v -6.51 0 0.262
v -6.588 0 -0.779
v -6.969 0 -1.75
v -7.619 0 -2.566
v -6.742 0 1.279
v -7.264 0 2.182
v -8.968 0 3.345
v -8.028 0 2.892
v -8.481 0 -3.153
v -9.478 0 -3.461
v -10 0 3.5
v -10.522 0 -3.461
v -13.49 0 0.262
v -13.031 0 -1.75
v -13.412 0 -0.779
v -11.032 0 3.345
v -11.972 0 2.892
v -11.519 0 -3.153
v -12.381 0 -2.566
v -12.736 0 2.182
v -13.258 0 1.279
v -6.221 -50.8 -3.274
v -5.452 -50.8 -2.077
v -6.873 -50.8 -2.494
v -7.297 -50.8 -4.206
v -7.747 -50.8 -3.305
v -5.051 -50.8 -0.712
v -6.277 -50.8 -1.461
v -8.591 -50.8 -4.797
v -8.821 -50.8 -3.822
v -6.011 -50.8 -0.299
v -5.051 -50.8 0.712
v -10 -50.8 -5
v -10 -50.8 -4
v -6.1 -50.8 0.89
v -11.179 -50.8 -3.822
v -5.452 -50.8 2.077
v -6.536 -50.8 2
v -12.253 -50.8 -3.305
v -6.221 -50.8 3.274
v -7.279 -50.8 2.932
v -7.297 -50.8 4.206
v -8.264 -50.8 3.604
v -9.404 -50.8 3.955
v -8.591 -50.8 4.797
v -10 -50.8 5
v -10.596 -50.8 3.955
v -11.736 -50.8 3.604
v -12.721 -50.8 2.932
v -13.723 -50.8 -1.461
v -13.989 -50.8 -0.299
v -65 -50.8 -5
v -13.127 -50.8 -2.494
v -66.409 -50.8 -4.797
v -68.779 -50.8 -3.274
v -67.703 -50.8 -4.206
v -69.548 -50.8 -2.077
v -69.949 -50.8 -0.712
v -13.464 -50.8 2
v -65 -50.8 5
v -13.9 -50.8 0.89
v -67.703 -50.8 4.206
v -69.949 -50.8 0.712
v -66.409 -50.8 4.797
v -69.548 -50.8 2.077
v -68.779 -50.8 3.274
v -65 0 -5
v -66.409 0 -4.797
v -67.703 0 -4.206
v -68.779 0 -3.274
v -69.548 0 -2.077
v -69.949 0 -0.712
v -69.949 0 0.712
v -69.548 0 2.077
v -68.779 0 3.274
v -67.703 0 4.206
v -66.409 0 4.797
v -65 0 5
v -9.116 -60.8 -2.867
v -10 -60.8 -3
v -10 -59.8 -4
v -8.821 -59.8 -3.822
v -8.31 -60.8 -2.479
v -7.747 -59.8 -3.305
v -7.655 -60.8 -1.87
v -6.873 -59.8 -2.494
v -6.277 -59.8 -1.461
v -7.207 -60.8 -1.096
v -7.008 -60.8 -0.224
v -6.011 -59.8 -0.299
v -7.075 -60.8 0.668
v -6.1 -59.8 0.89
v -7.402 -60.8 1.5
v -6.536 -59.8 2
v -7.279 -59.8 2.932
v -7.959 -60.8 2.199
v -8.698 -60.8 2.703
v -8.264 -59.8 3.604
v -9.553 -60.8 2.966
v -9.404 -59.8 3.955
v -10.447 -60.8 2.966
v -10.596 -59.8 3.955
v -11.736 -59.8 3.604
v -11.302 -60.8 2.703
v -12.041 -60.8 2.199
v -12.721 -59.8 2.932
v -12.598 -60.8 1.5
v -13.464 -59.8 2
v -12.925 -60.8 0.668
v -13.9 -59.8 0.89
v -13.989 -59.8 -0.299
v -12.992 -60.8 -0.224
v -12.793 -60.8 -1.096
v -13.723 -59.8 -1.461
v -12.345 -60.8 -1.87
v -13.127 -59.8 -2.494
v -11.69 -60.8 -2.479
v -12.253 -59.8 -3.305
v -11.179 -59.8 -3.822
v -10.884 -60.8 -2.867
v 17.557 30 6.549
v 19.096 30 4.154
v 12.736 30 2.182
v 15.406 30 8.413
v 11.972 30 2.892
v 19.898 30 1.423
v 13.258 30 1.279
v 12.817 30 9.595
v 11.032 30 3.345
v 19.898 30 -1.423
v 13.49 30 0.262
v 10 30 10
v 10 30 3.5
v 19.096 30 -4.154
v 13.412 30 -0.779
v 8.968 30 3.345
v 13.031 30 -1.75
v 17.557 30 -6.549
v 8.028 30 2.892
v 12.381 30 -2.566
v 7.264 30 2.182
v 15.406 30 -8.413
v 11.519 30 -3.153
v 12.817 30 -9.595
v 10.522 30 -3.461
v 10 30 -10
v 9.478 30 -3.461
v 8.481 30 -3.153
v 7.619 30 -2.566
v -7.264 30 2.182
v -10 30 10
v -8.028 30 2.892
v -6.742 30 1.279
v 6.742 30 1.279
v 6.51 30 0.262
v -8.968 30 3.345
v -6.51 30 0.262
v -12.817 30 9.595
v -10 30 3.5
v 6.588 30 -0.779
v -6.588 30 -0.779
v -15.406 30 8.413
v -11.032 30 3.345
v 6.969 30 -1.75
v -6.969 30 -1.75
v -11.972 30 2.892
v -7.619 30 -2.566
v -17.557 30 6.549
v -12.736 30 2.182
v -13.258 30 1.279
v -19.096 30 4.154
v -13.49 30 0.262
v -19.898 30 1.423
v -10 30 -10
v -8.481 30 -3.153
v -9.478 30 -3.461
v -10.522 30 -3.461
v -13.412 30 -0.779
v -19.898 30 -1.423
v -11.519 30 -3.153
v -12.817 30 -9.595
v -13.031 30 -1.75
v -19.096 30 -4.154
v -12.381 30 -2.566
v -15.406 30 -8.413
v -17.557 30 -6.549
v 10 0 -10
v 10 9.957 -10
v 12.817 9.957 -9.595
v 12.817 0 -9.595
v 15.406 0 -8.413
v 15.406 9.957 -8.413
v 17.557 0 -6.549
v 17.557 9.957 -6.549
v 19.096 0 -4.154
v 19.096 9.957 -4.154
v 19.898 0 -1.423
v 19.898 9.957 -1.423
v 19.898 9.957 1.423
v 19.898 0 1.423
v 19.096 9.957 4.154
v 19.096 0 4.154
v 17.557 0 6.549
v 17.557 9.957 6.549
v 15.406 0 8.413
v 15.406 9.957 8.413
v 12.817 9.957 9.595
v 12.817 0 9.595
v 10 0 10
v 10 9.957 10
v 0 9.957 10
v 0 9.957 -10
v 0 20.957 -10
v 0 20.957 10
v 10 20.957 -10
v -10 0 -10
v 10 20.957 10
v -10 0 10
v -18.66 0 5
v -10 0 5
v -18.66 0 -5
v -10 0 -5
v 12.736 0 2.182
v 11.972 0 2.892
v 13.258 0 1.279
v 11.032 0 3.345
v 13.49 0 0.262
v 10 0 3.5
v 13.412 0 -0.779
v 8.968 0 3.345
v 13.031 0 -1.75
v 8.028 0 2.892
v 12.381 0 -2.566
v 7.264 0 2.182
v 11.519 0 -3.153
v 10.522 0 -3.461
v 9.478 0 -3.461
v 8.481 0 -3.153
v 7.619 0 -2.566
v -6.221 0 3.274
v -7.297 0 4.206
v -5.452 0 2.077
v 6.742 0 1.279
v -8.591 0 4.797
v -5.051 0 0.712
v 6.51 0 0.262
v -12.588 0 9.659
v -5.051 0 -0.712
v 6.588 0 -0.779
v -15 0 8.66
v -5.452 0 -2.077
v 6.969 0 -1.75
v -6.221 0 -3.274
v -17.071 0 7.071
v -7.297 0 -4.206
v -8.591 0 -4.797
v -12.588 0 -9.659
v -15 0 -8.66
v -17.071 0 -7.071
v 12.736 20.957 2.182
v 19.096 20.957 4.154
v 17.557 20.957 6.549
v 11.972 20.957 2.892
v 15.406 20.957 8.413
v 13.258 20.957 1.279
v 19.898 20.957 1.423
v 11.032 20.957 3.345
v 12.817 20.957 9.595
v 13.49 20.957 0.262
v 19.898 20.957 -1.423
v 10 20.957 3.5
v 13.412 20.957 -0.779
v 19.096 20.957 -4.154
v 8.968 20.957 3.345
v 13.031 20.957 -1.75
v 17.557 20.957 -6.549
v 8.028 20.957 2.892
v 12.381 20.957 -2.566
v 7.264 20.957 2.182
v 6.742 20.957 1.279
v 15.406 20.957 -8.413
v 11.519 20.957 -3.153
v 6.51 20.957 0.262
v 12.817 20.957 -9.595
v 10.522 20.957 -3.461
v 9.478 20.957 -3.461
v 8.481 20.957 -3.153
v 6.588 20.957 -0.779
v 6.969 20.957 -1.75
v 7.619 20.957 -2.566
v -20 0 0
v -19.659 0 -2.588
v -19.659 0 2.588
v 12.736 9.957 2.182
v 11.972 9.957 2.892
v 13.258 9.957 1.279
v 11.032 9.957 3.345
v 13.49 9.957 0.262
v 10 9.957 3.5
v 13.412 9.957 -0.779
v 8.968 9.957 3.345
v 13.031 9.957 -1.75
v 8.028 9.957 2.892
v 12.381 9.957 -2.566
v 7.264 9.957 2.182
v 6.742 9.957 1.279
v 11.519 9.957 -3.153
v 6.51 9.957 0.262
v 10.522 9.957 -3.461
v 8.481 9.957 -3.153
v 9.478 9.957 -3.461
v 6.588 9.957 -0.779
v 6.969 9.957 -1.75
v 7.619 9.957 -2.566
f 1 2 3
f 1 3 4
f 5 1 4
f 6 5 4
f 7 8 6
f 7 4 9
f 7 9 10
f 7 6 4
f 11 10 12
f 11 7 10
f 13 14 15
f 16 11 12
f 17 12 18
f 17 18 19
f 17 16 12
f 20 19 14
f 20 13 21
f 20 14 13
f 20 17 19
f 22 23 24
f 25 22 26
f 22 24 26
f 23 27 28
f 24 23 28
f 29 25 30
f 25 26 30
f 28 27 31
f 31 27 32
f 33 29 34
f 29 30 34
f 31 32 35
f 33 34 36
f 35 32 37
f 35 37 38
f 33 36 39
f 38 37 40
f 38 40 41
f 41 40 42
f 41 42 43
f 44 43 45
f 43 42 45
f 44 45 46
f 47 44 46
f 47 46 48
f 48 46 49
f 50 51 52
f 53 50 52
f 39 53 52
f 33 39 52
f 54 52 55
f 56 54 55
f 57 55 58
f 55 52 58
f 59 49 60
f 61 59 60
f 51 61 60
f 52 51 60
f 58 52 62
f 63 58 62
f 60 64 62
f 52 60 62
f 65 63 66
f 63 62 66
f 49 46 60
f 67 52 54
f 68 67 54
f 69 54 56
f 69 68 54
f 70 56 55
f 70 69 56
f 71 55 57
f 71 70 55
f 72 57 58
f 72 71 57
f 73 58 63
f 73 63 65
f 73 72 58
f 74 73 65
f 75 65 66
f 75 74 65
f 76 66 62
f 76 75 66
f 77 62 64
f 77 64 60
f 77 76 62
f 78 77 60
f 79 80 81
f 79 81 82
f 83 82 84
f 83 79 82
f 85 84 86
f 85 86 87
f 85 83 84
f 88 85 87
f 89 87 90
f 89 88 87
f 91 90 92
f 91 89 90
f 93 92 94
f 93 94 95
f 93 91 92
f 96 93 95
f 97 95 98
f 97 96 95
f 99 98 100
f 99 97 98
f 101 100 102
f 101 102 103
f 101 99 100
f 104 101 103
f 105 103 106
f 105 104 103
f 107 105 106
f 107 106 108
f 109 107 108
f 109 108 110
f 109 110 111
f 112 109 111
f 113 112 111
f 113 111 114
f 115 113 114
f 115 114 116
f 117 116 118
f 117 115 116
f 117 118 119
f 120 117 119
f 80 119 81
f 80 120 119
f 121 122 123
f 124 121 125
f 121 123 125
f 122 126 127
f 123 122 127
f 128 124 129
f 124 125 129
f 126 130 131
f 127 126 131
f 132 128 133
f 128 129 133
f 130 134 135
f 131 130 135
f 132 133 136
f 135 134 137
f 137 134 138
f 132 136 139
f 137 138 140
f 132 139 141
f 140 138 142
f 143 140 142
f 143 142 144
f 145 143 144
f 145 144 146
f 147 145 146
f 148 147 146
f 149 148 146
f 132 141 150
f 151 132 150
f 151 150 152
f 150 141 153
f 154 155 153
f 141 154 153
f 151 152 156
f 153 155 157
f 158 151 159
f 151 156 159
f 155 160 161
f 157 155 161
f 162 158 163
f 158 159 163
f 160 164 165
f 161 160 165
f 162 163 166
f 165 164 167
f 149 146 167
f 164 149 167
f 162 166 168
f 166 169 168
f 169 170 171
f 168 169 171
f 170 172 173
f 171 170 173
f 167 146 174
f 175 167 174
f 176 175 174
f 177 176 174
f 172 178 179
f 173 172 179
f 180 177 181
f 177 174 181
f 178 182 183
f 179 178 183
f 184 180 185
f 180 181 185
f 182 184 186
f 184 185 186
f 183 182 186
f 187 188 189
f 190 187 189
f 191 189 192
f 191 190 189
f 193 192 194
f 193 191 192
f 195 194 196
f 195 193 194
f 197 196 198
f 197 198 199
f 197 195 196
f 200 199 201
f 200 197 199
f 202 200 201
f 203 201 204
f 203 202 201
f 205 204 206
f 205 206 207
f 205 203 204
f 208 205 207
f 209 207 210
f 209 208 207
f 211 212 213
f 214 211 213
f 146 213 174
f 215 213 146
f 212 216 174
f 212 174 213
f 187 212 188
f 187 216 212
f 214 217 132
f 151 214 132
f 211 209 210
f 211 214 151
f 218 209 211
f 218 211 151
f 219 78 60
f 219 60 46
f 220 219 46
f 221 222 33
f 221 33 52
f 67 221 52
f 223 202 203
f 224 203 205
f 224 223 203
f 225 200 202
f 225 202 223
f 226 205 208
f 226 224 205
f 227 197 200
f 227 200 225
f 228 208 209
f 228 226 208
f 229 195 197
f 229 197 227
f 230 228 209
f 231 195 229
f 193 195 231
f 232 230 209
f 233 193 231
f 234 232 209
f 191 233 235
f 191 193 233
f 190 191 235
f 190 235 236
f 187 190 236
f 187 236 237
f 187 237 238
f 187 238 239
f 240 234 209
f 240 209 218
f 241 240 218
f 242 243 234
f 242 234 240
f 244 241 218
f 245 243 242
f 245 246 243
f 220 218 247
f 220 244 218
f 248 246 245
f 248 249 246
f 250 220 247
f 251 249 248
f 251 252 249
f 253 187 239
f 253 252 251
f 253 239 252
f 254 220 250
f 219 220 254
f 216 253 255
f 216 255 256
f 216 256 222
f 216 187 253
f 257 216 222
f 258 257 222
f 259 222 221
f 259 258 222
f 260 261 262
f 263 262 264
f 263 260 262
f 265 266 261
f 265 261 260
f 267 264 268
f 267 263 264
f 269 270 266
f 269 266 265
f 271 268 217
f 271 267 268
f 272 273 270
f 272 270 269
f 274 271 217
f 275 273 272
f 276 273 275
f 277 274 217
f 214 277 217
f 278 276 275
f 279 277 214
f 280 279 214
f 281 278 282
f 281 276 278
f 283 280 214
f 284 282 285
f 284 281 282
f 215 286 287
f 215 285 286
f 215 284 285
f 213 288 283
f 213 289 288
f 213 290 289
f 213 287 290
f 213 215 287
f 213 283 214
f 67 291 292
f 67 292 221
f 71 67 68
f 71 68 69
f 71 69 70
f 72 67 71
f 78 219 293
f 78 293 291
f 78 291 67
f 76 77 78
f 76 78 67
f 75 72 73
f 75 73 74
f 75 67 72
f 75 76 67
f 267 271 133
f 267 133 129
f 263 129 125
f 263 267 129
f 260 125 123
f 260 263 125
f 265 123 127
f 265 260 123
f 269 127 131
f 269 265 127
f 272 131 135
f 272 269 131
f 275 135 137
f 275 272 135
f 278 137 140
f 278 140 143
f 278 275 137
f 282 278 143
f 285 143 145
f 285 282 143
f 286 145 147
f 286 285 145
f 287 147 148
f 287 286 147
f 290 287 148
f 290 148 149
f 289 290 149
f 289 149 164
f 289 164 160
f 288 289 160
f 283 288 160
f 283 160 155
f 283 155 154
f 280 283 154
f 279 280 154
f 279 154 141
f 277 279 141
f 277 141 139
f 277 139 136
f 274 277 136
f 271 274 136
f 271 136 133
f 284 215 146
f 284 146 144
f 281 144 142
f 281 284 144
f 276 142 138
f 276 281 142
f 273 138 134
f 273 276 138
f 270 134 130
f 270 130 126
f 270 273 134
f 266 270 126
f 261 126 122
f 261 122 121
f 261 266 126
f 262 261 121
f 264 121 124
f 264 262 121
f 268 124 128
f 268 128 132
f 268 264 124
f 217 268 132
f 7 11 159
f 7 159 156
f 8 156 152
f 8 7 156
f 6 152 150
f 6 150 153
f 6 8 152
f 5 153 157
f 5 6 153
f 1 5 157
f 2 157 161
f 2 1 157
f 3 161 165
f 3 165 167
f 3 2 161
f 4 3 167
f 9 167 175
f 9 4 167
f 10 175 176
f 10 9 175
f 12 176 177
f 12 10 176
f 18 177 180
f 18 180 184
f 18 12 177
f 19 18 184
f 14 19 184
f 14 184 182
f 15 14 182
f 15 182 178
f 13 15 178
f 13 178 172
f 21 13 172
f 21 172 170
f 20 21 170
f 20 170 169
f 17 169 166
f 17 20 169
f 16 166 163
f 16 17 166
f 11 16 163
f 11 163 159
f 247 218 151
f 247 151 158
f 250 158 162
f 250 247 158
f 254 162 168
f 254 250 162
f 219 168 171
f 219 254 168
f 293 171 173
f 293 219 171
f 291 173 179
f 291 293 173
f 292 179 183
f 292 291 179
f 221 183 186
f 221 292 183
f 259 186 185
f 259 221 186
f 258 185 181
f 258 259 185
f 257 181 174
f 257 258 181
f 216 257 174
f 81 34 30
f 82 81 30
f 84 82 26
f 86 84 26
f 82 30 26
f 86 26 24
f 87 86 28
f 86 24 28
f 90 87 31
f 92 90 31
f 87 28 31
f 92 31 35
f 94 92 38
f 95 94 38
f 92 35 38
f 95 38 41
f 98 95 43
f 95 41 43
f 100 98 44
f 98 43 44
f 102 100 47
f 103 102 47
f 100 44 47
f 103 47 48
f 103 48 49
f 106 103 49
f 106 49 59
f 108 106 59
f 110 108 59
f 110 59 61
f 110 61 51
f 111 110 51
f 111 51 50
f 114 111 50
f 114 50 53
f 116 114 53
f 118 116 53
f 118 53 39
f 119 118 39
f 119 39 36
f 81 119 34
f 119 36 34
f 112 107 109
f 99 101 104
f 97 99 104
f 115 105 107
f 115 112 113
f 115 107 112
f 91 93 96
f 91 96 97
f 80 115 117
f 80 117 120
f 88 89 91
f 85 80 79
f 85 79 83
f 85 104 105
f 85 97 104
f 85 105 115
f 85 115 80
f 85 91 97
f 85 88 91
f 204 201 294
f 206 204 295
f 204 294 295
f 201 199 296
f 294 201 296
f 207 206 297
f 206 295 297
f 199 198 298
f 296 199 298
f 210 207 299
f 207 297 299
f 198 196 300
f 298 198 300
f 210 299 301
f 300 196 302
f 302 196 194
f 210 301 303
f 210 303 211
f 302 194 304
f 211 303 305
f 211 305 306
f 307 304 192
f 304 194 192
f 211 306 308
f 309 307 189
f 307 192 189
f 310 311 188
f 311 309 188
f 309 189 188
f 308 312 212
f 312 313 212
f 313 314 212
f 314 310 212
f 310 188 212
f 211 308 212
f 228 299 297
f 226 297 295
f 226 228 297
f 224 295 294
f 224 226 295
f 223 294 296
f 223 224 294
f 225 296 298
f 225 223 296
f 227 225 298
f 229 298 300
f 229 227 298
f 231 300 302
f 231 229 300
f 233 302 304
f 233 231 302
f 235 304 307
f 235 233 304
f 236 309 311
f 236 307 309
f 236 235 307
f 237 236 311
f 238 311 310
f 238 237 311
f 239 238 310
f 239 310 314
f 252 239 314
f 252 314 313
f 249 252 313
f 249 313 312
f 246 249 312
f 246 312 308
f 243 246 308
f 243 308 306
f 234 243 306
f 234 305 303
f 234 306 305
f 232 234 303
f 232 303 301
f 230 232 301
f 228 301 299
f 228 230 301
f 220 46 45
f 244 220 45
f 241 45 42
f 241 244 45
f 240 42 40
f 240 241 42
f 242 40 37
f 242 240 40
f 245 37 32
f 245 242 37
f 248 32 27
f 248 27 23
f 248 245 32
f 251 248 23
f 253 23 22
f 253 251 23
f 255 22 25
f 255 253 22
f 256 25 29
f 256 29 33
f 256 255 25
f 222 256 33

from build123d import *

# Parameters (mm, degrees)
SKETCH1_R           = 3.5
BOSS_EXTRUDE1_DEPTH = 30
BOSS_EXTRUDE2_DEPTH = 50.8
SKETCH3_R           = 4
BOSS_EXTRUDE3_DEPTH = 10
CHAMFER1_SIZE       = 1
SKETCH4_W           = 30
SKETCH4_H           = 11
CUT_EXTRUDE1_DEPTH  = 95.850619397


with BuildPart() as part:
    # Sketch1 → Boss-Extrude1 (new body)
    with BuildSketch(Plane(origin=(0, 0, 0), x_dir=(1, 0, 0), z_dir=(0, 1, 0))):
        with BuildLine():
            Line((-10, 10), (10, 10))
            ThreePointArc((10, 10), (20, 0), (10, -10))
            Line((10, -10), (-10, -10))
            ThreePointArc((-10, -10), (-20, 0), (-10, 10))
        make_face()
        with Locations(Location((-10, 0, 0), (0, 0, 270))):
            Circle(SKETCH1_R, mode=Mode.SUBTRACT)
        with Locations(Location((10, 0, 0), (0, 0, 270))):
            Circle(SKETCH1_R, mode=Mode.SUBTRACT)
    extrude(amount=BOSS_EXTRUDE1_DEPTH)

    # Sketch2 → Boss-Extrude2 (add)
    with BuildSketch(Plane.XZ):
        with BuildLine():
            Line((-10, -5), (-65, -5))
            ThreePointArc((-65, -5), (-70, 0), (-65, 5))
            Line((-65, 5), (-10, 5))
            ThreePointArc((-10, 5), (-5, 0), (-10, -5))
        make_face()
    extrude(amount=BOSS_EXTRUDE2_DEPTH)

    # Sketch3 → Boss-Extrude3 (add)
    with BuildSketch(Plane.XZ.offset(50.8)):
        with Locations(Location((-10, 0, 0), (0, 0, 270))):
            Circle(SKETCH3_R)
    extrude(amount=BOSS_EXTRUDE3_DEPTH)

    # Chamfer1
    chamfer1_edges = [part.edges().sort_by_distance(p)[0] for p in [
        (-10, -60.8, 4),
    ]]
    chamfer(chamfer1_edges, length=CHAMFER1_SIZE)

    # Sketch4 → Cut-Extrude1 (cut, through all)
    with BuildSketch(Plane(origin=(0, 0, -10), x_dir=(-1, 0, 0), z_dir=(0, 0, -1))):
        with Locations((-15, 15.456720209)):
            Rectangle(SKETCH4_W, SKETCH4_H)
    extrude(amount=-CUT_EXTRUDE1_DEPTH, mode=Mode.SUBTRACT)


solid = part.part
